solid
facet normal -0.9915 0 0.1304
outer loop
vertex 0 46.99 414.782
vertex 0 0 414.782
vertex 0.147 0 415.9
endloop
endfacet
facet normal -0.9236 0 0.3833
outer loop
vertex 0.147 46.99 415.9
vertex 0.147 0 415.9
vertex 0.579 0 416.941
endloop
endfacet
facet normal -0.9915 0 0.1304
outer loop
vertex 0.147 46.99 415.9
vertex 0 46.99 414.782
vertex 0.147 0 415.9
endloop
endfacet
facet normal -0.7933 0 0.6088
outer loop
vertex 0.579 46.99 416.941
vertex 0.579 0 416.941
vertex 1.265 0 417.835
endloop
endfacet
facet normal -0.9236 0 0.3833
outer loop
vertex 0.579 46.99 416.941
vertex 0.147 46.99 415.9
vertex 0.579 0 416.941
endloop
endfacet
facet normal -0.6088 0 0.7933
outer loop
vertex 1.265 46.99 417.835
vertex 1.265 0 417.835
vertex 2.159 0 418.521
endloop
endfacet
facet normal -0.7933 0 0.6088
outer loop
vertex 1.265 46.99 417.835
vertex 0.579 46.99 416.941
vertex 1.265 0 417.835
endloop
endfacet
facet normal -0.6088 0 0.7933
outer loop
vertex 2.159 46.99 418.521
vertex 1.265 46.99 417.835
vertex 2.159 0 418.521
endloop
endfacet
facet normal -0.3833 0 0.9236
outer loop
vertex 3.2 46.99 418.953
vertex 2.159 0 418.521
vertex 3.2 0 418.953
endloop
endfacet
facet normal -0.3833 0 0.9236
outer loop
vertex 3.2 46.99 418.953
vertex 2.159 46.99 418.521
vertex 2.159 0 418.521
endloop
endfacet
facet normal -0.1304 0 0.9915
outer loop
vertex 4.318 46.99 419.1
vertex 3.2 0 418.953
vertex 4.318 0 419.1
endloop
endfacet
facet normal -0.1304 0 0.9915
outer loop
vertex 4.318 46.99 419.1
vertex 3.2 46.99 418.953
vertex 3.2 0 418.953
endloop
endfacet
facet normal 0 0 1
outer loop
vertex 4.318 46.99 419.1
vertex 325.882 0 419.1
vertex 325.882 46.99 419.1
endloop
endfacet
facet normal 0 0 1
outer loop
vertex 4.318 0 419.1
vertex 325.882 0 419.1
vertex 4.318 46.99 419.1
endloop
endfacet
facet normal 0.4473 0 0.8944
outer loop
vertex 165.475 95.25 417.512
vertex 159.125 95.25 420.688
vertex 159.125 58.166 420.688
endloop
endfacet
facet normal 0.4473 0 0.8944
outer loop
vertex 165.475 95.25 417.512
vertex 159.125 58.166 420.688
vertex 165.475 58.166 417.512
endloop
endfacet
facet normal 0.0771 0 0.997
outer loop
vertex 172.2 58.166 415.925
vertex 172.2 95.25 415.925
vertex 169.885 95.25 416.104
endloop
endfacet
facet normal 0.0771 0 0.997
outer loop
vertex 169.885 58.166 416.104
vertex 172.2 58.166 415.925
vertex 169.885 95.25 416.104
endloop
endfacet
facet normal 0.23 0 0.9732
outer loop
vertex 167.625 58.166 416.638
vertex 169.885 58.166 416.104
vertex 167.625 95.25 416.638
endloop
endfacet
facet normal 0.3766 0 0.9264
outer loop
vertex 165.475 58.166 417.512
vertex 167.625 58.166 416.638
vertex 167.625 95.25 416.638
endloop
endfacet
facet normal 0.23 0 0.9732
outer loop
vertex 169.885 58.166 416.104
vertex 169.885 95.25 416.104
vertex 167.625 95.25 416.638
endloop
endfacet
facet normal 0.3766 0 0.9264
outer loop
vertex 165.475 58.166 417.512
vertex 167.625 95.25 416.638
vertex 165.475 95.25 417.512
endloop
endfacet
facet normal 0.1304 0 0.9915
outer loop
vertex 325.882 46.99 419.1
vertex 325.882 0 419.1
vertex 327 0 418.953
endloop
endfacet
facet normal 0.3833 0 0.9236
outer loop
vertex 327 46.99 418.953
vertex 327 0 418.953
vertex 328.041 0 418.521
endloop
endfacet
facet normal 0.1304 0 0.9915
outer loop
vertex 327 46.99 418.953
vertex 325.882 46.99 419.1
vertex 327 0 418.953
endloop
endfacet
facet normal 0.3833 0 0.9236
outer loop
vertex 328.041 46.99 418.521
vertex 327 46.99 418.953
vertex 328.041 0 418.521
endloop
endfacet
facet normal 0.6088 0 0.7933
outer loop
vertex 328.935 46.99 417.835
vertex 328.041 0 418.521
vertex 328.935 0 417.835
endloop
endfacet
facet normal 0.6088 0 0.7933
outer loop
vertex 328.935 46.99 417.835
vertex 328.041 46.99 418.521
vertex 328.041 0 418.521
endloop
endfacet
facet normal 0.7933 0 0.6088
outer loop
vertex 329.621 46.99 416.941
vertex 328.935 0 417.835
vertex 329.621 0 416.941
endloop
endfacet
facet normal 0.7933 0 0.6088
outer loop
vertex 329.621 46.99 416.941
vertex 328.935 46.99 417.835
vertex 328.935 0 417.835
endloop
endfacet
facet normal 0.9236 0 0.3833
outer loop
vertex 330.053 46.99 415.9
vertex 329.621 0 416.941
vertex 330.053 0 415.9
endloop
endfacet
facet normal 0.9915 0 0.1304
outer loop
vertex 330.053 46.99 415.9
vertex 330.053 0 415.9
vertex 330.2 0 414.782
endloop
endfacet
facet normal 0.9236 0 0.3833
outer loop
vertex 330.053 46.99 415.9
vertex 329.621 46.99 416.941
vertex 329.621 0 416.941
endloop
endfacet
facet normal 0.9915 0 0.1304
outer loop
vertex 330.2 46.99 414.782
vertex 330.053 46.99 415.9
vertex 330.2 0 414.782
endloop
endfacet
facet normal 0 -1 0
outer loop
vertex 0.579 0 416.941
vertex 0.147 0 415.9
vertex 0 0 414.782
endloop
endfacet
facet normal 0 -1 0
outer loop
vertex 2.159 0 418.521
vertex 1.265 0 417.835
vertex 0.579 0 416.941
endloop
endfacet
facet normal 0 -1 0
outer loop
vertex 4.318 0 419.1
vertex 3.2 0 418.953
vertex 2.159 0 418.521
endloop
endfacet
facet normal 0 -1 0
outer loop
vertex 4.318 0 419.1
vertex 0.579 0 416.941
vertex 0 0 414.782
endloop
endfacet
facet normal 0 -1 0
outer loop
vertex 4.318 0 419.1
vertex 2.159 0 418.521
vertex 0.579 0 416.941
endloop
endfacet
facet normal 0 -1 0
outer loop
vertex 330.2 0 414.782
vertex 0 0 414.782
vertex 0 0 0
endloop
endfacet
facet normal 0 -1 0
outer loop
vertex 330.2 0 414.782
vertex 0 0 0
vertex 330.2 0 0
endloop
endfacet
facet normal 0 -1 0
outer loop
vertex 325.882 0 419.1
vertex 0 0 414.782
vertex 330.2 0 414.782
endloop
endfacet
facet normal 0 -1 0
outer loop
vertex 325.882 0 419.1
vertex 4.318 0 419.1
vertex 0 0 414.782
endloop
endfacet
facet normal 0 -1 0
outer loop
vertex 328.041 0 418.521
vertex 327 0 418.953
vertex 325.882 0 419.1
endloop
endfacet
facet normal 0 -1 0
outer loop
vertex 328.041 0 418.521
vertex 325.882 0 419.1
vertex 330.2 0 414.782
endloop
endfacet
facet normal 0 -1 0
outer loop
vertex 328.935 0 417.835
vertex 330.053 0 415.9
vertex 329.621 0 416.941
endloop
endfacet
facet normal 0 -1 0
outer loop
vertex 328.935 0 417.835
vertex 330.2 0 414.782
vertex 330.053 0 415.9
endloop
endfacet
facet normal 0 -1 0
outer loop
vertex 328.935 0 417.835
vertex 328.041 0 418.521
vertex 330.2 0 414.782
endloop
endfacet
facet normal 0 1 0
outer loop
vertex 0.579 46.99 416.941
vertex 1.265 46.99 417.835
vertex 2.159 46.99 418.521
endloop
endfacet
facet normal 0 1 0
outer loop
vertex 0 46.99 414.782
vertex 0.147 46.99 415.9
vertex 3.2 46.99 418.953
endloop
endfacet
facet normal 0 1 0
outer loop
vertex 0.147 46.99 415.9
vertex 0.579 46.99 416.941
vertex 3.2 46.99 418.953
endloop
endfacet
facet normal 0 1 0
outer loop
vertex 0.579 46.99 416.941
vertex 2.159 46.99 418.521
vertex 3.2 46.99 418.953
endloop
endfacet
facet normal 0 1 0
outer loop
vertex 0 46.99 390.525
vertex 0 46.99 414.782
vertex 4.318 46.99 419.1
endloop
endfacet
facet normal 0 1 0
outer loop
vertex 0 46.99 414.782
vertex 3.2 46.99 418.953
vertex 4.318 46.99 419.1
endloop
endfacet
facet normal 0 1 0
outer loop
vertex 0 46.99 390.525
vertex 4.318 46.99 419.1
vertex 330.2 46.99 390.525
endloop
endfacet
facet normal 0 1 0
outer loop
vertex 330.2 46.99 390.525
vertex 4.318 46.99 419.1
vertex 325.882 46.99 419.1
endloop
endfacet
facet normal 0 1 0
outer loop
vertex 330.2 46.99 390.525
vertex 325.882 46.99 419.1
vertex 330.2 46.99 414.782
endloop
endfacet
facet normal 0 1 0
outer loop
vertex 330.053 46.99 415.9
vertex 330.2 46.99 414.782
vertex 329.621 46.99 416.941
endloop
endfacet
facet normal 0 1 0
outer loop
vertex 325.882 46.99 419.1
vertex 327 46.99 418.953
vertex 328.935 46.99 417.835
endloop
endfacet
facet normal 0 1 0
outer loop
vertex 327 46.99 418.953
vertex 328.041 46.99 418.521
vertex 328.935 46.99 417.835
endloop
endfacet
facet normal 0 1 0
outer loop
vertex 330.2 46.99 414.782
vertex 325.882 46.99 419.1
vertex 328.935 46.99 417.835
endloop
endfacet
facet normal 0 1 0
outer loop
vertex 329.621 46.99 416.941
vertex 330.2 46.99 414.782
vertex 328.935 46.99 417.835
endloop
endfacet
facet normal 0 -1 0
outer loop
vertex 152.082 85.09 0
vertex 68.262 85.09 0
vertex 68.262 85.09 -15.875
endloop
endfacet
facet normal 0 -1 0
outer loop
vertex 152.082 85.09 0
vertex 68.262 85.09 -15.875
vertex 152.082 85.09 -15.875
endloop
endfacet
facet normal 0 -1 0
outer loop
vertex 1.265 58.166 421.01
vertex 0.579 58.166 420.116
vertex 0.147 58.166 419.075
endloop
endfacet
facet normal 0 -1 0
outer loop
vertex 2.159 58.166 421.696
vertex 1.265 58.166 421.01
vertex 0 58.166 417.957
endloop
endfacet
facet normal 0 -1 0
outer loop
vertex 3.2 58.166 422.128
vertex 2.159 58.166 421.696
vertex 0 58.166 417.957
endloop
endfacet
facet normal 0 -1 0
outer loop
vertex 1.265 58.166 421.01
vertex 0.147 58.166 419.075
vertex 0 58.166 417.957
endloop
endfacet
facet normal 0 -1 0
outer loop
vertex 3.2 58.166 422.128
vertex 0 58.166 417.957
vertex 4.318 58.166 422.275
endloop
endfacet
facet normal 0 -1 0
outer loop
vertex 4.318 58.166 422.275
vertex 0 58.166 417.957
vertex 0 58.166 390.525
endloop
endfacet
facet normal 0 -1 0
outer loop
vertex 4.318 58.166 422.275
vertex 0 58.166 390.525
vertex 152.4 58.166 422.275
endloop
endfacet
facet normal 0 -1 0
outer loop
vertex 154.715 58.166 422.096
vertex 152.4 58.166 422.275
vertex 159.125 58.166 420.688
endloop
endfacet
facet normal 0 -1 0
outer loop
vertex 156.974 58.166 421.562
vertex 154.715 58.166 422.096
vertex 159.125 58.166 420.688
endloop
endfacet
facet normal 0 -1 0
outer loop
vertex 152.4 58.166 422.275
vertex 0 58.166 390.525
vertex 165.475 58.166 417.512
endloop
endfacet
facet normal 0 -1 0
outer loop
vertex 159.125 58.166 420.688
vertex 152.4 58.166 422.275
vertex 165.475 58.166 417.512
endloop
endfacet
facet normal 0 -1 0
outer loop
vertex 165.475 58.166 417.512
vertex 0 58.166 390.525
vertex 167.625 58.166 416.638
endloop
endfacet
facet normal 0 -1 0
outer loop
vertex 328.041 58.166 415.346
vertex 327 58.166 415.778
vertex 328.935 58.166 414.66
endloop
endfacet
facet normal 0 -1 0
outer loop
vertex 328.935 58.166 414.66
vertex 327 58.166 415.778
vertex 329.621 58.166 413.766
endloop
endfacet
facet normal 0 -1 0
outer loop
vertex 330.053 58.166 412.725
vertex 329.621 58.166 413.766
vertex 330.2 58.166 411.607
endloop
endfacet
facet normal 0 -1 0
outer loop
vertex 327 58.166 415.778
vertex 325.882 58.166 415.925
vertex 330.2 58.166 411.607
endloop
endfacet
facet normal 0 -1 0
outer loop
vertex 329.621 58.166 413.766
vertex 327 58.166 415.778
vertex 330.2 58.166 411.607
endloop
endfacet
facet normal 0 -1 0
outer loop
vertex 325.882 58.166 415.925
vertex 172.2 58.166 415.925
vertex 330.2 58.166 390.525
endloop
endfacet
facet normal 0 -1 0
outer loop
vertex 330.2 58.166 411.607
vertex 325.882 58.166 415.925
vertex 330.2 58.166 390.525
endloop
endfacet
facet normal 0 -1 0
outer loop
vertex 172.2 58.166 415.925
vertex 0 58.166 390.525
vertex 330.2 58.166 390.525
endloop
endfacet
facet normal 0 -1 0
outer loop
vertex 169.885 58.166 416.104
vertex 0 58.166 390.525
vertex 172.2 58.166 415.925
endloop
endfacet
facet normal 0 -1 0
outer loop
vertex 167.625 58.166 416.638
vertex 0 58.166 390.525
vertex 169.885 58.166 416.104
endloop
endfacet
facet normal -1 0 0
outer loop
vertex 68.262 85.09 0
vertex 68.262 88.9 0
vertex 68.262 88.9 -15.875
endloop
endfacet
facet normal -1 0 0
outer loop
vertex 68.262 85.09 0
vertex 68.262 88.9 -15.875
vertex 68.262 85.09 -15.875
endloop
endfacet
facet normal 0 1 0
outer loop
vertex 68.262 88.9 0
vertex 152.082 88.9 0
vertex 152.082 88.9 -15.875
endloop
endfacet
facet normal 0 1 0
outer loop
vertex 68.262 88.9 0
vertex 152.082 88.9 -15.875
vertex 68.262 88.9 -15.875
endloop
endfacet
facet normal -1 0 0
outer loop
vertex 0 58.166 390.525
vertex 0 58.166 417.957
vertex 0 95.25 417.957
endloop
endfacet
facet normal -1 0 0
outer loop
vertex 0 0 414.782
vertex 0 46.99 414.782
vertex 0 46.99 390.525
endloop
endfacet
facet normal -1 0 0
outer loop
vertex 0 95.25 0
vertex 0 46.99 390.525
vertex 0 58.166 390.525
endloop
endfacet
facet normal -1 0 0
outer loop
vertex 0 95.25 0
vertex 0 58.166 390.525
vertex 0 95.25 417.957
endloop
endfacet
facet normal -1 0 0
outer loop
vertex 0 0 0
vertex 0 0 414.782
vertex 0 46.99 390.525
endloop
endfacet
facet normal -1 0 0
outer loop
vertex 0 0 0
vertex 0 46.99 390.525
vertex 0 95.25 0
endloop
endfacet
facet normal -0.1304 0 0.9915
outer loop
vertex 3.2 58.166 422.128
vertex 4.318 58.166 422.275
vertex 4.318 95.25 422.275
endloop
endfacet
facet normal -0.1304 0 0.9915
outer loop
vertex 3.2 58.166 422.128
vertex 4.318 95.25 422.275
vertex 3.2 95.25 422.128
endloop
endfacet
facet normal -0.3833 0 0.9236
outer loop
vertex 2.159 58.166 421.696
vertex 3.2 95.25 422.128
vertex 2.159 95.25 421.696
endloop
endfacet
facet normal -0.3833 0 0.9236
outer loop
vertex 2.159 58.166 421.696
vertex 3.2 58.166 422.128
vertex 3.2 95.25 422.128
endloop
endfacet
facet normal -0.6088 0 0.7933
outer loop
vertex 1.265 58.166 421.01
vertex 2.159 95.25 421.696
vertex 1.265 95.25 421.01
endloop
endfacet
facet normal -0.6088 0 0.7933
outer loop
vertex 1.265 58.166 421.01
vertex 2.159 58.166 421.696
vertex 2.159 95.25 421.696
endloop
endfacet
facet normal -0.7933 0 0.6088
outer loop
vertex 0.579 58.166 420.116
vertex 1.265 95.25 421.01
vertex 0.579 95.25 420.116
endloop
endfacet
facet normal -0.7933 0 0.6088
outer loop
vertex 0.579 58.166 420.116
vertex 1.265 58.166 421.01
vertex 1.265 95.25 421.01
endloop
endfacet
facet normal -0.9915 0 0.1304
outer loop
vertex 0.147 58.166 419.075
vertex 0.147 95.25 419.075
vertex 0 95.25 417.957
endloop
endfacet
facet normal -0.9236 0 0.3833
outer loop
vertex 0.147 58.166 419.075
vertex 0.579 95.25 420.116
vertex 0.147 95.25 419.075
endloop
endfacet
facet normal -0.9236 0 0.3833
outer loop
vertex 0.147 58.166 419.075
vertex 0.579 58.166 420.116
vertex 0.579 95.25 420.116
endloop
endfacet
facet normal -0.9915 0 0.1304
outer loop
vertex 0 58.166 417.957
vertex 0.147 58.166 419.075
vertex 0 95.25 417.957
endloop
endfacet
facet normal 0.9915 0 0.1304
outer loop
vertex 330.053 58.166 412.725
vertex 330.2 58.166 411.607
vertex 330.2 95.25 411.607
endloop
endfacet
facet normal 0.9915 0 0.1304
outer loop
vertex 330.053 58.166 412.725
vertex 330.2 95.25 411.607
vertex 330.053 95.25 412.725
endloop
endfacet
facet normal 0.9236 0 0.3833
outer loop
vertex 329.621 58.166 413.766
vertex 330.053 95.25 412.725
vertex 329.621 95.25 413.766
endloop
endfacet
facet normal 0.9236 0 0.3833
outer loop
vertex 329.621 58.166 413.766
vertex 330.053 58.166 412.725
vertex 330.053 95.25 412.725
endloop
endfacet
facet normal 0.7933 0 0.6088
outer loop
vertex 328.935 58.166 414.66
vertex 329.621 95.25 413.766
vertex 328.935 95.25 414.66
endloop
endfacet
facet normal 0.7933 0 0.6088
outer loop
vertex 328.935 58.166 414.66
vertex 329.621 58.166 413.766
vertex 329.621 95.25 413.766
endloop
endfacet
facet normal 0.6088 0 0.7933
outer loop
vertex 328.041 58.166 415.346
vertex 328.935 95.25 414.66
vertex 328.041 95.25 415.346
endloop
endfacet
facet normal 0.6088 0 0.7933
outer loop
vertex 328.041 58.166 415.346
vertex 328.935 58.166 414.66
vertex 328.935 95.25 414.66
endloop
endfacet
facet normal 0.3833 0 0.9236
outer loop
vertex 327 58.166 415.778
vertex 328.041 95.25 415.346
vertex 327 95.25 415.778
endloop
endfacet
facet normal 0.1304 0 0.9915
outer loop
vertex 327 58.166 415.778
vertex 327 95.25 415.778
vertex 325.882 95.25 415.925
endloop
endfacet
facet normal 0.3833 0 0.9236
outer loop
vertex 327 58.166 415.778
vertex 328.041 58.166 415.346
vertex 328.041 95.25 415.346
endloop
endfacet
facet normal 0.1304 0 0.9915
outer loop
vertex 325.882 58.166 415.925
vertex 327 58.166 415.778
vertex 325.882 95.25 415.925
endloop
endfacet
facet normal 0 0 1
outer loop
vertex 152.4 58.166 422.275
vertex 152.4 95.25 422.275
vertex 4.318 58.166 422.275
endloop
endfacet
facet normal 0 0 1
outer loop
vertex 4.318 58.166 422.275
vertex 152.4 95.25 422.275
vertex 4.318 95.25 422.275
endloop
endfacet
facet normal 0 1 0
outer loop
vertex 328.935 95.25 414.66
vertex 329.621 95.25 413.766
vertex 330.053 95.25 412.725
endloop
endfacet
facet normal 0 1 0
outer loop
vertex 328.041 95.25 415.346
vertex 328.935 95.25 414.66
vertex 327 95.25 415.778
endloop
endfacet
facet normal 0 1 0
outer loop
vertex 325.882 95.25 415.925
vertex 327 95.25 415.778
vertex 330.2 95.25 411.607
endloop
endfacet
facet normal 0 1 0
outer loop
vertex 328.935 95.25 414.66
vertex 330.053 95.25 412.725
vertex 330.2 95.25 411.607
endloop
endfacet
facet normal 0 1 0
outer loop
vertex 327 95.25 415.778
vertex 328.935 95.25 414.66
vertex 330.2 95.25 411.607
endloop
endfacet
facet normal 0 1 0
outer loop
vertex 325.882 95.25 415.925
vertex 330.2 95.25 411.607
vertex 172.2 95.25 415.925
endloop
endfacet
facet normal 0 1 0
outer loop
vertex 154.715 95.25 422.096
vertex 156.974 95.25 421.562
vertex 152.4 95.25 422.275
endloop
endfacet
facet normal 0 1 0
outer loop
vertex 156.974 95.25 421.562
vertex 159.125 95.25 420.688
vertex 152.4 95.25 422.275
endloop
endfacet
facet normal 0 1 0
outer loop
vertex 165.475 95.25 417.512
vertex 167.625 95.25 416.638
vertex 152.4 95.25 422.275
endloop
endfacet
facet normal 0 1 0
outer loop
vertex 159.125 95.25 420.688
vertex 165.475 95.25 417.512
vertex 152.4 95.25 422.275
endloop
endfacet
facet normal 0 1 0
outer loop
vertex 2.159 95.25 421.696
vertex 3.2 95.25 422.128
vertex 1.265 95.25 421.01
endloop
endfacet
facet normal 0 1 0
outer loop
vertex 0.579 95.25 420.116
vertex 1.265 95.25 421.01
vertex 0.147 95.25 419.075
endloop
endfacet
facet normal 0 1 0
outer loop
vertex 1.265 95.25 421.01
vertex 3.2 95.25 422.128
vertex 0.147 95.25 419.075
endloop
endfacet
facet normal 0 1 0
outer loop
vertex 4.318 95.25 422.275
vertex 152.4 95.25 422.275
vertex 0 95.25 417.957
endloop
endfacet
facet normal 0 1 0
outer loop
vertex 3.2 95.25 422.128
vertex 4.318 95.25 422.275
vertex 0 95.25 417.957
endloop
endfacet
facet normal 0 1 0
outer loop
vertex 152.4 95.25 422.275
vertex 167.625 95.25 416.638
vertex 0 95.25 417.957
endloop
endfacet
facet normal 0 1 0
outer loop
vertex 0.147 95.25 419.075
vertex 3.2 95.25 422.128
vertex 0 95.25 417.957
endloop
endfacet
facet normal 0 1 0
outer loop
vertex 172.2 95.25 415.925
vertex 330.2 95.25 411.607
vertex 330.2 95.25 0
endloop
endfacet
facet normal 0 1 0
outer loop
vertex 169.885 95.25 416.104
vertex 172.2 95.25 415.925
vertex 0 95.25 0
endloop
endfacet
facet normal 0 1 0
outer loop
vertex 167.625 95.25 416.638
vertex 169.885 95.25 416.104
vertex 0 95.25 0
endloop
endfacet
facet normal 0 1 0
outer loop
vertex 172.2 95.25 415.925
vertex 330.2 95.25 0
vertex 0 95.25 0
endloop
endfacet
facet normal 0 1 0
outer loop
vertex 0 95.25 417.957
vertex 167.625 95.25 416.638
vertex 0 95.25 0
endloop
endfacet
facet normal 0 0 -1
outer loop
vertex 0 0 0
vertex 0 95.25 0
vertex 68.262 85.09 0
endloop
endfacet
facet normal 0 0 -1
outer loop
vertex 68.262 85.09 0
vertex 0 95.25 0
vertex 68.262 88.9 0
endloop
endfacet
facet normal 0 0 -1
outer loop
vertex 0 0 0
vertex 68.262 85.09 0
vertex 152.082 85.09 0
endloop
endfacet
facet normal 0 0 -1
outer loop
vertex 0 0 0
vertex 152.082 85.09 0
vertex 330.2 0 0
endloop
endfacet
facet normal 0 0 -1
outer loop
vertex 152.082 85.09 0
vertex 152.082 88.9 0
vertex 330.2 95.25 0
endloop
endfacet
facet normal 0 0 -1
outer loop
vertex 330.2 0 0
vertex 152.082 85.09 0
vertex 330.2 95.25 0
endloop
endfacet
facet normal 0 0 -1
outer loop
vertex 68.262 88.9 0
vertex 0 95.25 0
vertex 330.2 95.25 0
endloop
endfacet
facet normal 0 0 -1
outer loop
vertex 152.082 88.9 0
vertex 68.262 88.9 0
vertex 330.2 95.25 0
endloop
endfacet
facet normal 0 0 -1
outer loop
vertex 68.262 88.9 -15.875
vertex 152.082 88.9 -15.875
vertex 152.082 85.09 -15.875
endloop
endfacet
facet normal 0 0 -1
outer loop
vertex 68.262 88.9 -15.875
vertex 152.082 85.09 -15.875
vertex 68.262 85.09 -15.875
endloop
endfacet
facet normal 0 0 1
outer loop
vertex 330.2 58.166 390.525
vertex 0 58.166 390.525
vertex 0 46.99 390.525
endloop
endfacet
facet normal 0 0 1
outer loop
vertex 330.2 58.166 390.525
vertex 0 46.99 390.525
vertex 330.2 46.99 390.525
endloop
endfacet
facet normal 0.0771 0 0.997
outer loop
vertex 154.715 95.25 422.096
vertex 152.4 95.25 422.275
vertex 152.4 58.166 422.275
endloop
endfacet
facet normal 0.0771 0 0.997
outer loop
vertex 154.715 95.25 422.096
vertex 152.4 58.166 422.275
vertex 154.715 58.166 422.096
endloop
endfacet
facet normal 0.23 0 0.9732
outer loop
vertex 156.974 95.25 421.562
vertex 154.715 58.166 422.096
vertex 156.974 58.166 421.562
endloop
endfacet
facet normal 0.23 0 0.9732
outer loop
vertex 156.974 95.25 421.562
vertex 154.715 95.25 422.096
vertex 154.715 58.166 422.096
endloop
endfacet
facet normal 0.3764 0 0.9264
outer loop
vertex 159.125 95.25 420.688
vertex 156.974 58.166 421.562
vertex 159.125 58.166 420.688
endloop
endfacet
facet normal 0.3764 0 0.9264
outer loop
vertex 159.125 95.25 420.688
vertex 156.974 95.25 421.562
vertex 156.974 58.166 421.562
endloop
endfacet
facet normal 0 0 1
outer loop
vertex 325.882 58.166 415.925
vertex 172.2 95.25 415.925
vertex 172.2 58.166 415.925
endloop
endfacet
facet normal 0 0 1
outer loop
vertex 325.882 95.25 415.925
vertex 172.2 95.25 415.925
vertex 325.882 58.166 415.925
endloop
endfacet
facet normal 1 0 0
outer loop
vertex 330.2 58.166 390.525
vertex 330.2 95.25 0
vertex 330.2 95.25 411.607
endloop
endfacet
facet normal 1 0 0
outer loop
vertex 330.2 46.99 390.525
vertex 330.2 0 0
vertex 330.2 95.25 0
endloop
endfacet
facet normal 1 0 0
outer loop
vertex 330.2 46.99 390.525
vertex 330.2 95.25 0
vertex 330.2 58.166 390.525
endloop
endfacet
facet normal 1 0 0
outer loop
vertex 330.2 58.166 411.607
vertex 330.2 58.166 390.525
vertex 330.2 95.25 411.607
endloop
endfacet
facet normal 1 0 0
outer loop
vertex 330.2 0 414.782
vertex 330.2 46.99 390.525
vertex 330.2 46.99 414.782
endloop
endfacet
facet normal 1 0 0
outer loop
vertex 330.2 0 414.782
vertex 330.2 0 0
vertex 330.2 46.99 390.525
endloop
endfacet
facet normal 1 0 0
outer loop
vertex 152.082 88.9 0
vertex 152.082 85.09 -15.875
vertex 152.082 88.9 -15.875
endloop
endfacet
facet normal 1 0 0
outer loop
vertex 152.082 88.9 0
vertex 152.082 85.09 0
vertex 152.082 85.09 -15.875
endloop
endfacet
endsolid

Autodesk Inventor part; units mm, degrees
ref_plane "YZ Plane" through (0, 0, 0) normal (1, 0, 0) x (0, 1, 0)
ref_plane "XZ Plane" through (0, 0, 0) normal (0, 1, 0) x (-1, 0, 0)
ref_plane "XY Plane" through (0, 0, 0) normal (0, 0, 1) x (1, 0, 0)
sketch "Sketch1" plane through (0, 0, 0) normal (0, 0, 1) x (1, 0, 0)
  line L0 (0, 0) -> (330.2, 0)
  line L1 (330.2, 0) -> (330.2, 95.25)
  line L2 (330.2, 95.25) -> (0, 95.25)
  line L3 (0, 95.25) -> (0, 0)
  dimension "d0" = 95.25
  dimension "d1" = 330.2
extrude "Extrusion1" add sketch "Sketch1" along normal blind 390.525
sketch "Sketch2" plane through (0, 95.25, 0) normal (0, 1, 0) x (1, 0, 0)
  line L0 (330.2, 0) -> (330.2, -390.525) projected
  line L1 (0, 0) -> (0, -390.525) projected
  line L2 (172.1995, -415.925) -> (330.2, -415.925)
  line L3 (330.2, -415.925) -> (330.2, -390.525)
  line L4 (152.4, -422.275) -> (0, -422.275)
  line L5 (0, -422.275) -> (0, -390.525)
  line L6 (159.1248, -420.6875) -> (165.4748, -417.5125)
  arc A0 (172.1995, -415.925) -> (165.4748, -417.5125) centre (172.1995, -430.962) ccw
  arc A1 (152.4, -422.275) -> (159.1248, -420.6875) centre (152.4, -407.238) ccw
  line L7 (330.2, -390.525) -> (0, -390.525)
  dimension "d4" = 25.4
  dimension "d6" = 152.4
  dimension "d7" = 6.35
  dimension "d8" = 3.175
  dimension "d9" = 31.75
  dimension "d10" = 158.0005
extrude "Extrusion2" add sketch "Sketch2" against normal blind 37.084
sketch "Sketch3" plane through (0, 0, 0) normal (0, -1, 0) x (1, 0, 0)
  line L0 (330.2, 0) -> (330.2, 390.525) projected
  line L1 (0, 390.525) -> (330.2, 390.525)
  line L2 (330.2, 390.525) -> (330.2, 419.1)
  line L3 (330.2, 419.1) -> (0, 419.1)
  line L4 (0, 419.1) -> (0, 390.525)
  dimension "d13" = 28.575
extrude "Extrusion3" add sketch "Sketch3" against normal blind 46.99
fillet "Fillet1" radius 4.318 4 edges at (330.2, 76.708, 415.925) (0, 76.708, 422.275) (0, 23.495, 419.1) (330.2, 23.495, 419.1)
sketch "Sketch4" plane through (0, 0, 0) normal (0, 0, -1) x (-1, 0, 0)
  line L0 (0, 95.25) -> (0, 0) projected
  line L1 (-330.2, 95.25) -> (0, 95.25) projected
  line L2 (-152.0825, 88.9) -> (-68.2625, 88.9)
  line L3 (-68.2625, 88.9) -> (-68.2625, 85.09)
  line L4 (-68.2625, 85.09) -> (-152.0825, 85.09)
  line L5 (-152.0825, 85.09) -> (-152.0825, 88.9)
  dimension "d17" = 68.2625
  dimension "d18" = 6.35
  dimension "d19" = 83.82
  dimension "d20" = 3.81
extrude "Extrusion4" add sketch "Sketch4" along normal blind 15.875
properties part number "PC"
